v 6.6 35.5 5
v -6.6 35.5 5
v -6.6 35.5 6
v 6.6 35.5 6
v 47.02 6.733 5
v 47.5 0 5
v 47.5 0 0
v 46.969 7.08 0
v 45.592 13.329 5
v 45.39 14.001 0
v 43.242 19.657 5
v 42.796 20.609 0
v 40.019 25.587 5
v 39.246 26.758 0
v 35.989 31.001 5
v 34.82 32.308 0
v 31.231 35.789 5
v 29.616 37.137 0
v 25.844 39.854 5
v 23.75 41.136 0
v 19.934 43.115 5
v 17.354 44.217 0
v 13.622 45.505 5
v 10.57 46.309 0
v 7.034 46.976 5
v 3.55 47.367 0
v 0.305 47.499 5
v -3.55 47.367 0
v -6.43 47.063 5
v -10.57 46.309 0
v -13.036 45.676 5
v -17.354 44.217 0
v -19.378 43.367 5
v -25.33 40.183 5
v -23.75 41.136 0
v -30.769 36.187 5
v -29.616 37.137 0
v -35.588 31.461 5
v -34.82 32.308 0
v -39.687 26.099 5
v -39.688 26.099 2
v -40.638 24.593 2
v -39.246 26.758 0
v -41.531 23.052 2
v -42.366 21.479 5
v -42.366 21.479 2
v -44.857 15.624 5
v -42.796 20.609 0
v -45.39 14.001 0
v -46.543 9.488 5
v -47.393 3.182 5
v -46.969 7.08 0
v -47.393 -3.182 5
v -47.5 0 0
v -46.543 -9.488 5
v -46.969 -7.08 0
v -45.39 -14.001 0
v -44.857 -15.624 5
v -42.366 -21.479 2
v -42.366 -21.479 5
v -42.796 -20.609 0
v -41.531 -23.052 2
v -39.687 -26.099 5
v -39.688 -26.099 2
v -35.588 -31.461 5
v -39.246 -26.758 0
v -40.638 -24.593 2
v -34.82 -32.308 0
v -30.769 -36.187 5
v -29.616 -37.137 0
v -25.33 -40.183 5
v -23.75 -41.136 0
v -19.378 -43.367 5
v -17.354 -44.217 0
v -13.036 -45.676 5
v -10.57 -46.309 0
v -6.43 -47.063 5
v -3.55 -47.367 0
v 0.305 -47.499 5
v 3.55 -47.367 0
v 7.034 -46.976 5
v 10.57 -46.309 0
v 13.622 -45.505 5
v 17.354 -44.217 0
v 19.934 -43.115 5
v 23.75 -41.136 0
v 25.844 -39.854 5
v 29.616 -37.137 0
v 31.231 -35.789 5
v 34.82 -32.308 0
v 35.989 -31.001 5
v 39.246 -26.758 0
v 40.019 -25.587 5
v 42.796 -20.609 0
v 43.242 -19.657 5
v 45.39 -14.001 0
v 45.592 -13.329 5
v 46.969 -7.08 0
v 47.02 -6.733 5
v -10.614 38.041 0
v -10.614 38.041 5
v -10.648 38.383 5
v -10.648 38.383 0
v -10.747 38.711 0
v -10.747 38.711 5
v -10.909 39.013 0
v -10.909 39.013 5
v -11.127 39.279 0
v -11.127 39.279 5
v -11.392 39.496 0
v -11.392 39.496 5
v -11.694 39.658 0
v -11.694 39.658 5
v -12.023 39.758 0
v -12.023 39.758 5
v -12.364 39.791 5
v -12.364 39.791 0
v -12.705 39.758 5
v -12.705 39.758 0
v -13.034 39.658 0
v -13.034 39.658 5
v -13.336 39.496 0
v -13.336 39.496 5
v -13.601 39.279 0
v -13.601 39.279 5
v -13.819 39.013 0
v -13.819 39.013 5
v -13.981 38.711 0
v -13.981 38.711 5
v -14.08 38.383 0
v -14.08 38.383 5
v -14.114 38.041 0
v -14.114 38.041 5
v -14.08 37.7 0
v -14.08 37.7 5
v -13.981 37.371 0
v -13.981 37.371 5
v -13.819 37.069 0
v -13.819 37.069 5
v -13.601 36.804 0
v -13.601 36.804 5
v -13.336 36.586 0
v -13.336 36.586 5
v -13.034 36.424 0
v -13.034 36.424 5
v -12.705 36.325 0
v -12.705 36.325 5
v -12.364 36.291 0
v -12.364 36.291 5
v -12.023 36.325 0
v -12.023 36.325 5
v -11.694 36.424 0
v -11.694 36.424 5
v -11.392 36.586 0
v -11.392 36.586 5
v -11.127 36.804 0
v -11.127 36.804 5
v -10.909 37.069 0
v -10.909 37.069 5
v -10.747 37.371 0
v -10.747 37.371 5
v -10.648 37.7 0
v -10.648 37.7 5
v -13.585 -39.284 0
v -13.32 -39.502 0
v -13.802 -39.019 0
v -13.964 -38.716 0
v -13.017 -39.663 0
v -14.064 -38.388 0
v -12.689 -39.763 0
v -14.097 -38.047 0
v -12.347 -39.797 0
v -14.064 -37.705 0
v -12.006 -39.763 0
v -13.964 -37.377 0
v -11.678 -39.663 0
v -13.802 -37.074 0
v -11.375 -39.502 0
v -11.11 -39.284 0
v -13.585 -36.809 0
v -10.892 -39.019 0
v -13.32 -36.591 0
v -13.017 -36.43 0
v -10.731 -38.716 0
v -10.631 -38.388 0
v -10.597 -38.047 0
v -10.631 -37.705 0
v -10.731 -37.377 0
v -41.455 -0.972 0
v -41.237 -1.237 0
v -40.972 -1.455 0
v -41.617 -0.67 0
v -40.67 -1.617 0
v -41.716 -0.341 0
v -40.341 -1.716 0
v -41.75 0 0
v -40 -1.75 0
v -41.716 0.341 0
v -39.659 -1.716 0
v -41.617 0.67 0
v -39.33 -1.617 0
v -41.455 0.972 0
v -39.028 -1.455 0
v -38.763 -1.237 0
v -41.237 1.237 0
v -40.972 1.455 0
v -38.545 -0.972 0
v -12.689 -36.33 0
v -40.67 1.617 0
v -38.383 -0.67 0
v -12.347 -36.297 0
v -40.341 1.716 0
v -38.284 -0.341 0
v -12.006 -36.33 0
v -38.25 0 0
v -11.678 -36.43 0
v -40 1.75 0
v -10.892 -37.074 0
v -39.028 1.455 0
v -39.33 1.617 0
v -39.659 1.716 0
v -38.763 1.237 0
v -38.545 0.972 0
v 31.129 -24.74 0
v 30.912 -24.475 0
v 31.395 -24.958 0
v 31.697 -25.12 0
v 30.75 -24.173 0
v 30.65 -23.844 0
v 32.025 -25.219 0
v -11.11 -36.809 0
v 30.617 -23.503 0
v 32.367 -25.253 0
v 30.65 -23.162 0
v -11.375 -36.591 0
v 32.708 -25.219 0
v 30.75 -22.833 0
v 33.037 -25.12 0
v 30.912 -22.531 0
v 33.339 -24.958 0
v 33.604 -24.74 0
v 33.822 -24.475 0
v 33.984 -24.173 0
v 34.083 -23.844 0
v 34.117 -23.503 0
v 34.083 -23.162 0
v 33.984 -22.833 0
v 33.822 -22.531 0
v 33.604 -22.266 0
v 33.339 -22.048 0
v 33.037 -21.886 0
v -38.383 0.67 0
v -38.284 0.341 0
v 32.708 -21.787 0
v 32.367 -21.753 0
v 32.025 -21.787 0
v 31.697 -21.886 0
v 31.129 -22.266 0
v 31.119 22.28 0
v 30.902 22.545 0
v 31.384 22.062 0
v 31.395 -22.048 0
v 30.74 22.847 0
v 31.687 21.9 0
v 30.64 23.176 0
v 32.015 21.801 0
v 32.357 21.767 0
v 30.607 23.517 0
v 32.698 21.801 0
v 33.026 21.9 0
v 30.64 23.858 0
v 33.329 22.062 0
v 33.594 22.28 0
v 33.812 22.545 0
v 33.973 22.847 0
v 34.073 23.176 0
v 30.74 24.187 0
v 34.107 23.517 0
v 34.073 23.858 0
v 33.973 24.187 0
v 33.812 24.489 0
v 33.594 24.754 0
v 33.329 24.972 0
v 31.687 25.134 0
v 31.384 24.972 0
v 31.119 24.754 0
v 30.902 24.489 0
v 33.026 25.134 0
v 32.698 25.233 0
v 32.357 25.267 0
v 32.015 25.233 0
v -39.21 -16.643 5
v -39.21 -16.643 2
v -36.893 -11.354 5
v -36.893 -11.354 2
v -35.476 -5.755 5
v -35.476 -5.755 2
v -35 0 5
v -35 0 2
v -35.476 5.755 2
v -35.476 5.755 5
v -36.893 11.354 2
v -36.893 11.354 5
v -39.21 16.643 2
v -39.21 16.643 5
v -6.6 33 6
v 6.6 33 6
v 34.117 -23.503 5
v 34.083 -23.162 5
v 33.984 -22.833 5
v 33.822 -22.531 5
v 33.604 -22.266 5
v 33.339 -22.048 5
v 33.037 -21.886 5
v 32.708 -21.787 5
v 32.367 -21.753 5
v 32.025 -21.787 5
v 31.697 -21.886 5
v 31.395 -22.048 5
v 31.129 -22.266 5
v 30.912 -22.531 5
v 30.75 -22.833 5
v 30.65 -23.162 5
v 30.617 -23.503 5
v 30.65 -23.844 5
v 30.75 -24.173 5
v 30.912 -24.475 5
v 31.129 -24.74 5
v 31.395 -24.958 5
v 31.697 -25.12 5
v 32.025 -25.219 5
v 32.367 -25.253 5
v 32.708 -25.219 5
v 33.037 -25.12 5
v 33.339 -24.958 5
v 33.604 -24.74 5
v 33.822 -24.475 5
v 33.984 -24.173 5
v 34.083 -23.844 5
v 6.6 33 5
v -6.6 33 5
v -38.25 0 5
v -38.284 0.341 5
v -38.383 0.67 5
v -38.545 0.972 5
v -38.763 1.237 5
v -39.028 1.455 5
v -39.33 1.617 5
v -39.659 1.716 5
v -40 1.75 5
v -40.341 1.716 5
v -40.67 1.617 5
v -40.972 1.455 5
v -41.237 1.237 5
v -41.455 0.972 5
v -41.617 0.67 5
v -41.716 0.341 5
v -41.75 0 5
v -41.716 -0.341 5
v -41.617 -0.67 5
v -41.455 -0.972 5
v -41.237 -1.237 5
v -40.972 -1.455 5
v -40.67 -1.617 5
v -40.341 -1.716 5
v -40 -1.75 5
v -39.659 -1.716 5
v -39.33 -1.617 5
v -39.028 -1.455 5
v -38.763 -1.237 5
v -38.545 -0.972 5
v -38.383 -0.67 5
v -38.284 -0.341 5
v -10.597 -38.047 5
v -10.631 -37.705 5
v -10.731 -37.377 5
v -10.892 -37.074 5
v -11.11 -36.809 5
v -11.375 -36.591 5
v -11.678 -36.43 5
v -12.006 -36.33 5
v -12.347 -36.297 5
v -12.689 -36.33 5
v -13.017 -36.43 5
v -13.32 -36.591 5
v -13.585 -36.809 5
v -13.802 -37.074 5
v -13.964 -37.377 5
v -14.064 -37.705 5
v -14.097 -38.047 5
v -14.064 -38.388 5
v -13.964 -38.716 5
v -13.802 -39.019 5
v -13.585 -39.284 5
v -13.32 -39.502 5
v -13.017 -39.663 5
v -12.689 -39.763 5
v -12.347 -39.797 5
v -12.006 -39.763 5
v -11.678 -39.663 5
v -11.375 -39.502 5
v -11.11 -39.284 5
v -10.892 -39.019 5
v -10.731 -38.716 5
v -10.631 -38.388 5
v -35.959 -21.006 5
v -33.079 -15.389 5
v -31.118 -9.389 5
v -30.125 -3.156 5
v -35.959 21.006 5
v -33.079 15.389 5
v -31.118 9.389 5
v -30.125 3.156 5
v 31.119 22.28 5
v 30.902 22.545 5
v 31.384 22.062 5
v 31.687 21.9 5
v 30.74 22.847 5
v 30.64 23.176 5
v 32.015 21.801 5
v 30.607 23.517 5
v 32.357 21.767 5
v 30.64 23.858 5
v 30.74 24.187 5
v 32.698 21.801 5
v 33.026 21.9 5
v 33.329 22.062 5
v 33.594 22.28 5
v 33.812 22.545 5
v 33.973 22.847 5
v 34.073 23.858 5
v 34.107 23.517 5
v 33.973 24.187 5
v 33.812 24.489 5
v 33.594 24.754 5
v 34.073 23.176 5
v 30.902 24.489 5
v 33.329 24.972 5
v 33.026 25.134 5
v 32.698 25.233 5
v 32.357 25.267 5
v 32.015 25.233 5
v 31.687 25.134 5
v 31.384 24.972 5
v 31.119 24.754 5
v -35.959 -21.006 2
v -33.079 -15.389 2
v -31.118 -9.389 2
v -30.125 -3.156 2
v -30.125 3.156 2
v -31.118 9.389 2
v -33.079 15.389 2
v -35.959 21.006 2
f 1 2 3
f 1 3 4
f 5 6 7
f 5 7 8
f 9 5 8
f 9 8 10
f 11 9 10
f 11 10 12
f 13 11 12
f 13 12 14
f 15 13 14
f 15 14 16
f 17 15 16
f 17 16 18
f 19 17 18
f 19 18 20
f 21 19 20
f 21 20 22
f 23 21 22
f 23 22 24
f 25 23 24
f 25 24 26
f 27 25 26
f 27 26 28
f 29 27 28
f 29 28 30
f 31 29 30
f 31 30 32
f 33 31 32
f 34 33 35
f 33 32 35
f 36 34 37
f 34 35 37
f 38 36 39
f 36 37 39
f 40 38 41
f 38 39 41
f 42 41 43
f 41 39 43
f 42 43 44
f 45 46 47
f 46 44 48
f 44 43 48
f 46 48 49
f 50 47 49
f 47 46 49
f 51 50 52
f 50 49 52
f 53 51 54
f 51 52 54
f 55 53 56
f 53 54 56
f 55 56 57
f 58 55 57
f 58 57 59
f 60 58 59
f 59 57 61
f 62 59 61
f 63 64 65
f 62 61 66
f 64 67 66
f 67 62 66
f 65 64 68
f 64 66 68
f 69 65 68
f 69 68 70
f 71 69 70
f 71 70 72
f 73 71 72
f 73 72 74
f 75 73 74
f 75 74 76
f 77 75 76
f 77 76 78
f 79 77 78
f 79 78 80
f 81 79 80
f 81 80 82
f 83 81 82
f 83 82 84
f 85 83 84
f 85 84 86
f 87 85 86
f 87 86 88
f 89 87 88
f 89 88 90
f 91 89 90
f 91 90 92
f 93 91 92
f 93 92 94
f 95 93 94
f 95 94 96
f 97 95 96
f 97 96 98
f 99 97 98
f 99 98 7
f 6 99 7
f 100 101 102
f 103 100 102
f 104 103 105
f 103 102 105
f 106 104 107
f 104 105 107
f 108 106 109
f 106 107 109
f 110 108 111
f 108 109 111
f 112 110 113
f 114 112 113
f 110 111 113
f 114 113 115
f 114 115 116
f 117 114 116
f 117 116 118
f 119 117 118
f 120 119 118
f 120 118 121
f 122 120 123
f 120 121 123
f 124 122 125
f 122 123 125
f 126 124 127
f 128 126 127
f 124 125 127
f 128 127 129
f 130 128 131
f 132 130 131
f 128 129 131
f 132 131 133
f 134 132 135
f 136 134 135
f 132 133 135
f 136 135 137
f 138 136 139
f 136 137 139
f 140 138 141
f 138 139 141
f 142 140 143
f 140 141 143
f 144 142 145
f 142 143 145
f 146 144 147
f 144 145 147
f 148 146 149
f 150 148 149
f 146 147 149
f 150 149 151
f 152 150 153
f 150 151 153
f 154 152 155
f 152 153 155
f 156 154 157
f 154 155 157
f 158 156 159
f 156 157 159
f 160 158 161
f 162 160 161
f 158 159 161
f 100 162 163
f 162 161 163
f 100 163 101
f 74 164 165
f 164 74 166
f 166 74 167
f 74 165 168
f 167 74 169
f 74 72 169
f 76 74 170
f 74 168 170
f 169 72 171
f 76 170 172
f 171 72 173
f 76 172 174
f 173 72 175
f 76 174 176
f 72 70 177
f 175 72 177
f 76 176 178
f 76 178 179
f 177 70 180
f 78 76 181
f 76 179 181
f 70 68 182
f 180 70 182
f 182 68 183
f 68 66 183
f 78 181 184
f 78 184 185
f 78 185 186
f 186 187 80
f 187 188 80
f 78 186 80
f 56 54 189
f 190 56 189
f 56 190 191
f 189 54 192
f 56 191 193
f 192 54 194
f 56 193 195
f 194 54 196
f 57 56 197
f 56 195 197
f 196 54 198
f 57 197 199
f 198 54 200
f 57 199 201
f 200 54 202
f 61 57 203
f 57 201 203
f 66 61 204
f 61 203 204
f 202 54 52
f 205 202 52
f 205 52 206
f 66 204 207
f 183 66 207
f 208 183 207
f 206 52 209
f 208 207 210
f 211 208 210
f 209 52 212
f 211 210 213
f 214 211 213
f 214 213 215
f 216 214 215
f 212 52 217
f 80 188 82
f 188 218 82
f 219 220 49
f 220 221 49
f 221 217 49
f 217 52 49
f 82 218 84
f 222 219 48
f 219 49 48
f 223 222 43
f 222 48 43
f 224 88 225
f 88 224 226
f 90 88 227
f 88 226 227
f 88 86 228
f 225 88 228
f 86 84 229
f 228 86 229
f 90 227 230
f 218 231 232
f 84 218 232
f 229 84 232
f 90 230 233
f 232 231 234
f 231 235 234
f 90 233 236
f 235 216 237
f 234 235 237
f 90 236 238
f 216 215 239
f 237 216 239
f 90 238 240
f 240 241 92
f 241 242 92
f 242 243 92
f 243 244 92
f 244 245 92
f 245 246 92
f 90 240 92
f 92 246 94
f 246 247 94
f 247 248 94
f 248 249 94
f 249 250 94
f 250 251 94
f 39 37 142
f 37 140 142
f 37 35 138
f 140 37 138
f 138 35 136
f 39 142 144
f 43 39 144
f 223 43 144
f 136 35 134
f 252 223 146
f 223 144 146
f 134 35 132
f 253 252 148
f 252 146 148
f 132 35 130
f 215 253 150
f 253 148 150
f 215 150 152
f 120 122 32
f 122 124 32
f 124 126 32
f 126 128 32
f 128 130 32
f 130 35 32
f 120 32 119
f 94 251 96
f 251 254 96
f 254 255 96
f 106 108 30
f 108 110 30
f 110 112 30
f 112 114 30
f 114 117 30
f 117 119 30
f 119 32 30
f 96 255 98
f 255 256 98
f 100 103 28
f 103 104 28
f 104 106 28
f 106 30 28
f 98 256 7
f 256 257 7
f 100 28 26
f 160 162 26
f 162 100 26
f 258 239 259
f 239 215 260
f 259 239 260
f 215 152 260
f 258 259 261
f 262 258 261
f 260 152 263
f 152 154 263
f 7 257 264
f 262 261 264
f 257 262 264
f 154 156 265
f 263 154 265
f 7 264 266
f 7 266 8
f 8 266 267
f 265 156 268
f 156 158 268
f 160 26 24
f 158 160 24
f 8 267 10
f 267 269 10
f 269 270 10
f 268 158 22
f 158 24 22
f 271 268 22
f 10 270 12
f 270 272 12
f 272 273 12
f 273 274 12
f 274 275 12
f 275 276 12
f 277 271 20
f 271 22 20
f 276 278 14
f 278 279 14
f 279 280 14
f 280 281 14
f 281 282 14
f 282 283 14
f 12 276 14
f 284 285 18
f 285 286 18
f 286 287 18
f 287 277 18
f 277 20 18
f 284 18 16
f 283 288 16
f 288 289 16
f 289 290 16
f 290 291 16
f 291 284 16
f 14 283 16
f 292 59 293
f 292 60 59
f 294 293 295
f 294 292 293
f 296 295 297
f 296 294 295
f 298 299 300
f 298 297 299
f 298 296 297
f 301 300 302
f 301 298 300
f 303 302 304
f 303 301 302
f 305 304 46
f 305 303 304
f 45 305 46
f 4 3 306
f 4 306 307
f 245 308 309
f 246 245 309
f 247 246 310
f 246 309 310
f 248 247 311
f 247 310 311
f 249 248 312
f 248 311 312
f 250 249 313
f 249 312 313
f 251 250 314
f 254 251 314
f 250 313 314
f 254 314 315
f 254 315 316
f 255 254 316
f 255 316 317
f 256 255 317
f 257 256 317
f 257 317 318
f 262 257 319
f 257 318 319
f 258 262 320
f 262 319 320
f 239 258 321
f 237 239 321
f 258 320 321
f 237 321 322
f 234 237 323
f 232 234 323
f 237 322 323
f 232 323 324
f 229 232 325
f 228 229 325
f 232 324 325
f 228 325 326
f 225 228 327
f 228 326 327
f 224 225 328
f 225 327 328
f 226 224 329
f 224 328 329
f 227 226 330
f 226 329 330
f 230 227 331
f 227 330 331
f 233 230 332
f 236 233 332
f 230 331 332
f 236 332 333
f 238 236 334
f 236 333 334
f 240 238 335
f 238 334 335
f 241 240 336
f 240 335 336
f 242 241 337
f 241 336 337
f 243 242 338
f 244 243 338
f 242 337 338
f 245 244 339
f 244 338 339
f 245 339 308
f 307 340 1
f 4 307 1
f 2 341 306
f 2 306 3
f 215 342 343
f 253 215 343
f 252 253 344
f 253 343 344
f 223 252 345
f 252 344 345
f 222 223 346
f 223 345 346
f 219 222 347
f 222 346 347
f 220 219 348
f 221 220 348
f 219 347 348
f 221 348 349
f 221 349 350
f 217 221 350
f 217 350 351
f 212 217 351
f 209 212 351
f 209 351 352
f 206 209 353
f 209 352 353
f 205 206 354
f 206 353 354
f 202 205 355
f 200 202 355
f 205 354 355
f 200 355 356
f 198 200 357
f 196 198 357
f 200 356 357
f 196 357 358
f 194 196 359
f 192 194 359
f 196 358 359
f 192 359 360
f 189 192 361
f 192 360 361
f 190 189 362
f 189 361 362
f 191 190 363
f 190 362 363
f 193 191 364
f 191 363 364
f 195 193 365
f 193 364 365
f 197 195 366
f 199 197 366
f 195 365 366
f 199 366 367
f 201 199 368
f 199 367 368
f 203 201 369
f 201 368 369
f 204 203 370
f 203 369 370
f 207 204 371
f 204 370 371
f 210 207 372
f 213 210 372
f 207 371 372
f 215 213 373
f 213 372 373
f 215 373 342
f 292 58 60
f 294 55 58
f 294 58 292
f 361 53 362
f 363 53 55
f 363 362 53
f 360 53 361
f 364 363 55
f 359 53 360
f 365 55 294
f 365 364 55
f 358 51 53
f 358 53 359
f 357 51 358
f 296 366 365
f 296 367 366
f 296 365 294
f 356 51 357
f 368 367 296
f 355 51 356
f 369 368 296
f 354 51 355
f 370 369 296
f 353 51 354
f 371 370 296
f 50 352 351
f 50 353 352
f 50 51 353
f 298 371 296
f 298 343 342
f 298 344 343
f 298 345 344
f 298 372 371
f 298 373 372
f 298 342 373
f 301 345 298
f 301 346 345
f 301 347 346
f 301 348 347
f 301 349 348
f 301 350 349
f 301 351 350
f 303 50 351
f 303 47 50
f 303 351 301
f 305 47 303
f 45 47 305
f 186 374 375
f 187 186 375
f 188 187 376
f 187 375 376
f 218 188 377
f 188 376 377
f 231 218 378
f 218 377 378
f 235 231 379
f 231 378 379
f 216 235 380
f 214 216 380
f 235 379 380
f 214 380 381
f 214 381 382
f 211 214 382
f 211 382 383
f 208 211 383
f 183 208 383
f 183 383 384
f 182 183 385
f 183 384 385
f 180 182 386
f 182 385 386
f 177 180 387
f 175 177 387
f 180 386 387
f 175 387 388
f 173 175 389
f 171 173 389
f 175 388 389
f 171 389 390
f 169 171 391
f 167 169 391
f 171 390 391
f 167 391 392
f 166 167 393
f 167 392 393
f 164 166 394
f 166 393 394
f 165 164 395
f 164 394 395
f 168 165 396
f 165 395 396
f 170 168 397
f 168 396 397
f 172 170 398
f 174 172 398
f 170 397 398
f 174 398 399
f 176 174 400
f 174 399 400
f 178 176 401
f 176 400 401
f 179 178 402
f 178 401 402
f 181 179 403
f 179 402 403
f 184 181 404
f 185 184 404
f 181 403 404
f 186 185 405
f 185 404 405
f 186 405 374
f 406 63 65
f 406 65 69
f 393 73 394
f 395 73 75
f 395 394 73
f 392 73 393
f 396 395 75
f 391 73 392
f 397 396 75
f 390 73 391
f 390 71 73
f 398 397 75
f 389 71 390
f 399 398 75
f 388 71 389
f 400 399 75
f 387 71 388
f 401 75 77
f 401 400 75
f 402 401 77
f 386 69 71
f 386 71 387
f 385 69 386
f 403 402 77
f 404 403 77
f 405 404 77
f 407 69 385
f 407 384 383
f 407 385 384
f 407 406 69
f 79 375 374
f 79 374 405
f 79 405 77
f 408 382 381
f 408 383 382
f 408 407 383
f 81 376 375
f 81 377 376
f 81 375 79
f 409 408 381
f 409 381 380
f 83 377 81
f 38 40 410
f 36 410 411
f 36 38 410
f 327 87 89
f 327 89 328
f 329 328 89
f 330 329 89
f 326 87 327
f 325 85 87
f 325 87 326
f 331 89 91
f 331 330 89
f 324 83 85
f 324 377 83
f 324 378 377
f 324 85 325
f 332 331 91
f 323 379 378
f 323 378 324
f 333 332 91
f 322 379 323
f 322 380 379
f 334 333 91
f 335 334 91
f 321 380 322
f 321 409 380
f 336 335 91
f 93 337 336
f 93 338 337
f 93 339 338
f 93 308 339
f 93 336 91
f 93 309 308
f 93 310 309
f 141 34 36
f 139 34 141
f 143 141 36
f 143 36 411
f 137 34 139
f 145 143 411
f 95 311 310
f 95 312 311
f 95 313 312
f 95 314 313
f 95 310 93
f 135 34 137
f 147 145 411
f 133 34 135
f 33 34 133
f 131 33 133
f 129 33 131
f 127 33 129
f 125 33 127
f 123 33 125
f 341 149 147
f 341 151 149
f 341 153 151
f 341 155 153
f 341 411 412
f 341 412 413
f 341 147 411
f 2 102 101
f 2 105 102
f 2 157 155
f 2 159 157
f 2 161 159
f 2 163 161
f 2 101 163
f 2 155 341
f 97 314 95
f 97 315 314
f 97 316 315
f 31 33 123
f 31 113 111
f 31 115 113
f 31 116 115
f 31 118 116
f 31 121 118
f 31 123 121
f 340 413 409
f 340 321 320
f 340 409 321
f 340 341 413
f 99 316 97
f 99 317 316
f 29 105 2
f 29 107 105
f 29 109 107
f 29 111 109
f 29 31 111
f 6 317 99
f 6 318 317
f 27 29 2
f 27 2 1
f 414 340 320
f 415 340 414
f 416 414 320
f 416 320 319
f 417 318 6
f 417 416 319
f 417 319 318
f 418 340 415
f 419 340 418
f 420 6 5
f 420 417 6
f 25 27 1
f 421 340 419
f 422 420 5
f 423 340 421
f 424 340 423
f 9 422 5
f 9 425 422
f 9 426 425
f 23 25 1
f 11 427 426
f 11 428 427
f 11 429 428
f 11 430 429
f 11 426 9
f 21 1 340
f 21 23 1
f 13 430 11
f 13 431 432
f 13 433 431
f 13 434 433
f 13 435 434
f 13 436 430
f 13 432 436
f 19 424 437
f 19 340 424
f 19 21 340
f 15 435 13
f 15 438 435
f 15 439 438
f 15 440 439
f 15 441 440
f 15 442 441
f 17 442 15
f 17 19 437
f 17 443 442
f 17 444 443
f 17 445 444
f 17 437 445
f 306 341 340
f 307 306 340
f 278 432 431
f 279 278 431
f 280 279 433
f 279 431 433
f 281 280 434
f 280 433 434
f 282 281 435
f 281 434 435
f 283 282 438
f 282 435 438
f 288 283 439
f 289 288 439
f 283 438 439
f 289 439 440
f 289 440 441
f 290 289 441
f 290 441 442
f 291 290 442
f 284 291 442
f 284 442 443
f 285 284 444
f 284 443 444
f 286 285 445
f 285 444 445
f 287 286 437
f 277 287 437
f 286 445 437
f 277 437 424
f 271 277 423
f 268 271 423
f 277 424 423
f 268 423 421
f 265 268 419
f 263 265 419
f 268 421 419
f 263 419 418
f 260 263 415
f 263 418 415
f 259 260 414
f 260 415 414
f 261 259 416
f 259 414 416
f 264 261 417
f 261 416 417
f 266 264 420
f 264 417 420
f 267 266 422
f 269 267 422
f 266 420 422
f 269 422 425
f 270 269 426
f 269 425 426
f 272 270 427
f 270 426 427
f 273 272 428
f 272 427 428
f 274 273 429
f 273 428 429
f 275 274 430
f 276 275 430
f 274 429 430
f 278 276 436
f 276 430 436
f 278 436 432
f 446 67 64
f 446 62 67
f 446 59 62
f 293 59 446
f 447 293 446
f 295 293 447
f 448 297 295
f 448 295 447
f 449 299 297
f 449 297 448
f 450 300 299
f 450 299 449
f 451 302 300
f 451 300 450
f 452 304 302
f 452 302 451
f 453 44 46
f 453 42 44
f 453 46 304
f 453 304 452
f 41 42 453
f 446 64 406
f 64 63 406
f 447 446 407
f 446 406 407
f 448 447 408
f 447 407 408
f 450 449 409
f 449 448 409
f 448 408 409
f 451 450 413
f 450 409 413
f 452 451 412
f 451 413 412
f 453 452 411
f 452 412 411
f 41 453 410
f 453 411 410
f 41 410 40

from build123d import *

# Parameters (mm, degrees)
SKETCH008_R     = 47.5
PAD004_DEPTH    = 5
SKETCH009_R     = 40
SKETCH009_R_2   = 35
POCKET002_DEPTH = 3
SKETCH015_R     = 1.75
POCKET008_DEPTH = 5
SKETCH022_W     = 13.2
SKETCH022_H     = 2.5
PAD006_DEPTH    = 1


with BuildPart() as part:
    # Sketch008 → Pad004 (new body)
    with BuildSketch(Plane.XY):
        Circle(SKETCH008_R)
    extrude(amount=PAD004_DEPTH)

    # Sketch009 (on Face3 of Pad004) → Pocket002 (cut)
    with BuildSketch(Plane.XY.offset(5)):
        with Locations((-70, 0)):
            Circle(SKETCH009_R)
        with Locations((-70, 0)):
            Circle(SKETCH009_R_2, mode=Mode.SUBTRACT)
    extrude(amount=-POCKET002_DEPTH, mode=Mode.SUBTRACT)

    # Sketch015 (on Face3 of Pocket002) → Pocket008 (cut)
    with BuildSketch(Plane.XY.offset(5)):
        with Locations((-40, 0)):
            Circle(SKETCH015_R)
        with Locations((-12.363995, 38.041183)):
            Circle(SKETCH015_R)
        with Locations((32.356581, 23.51705)):
            Circle(SKETCH015_R)
        with Locations((32.366826, -23.502949)):
            Circle(SKETCH015_R)
        with Locations((-12.347418, -38.046567)):
            Circle(SKETCH015_R)
    extrude(amount=-POCKET008_DEPTH, mode=Mode.SUBTRACT)

    # Sketch022 (on Face3 of Pocket008) → Pad006 (join)
    with BuildSketch(Plane.XY.offset(5)):
        with Locations((0, 34.25)):
            Rectangle(SKETCH022_W, SKETCH022_H)
    extrude(amount=PAD006_DEPTH)


solid = part.part
